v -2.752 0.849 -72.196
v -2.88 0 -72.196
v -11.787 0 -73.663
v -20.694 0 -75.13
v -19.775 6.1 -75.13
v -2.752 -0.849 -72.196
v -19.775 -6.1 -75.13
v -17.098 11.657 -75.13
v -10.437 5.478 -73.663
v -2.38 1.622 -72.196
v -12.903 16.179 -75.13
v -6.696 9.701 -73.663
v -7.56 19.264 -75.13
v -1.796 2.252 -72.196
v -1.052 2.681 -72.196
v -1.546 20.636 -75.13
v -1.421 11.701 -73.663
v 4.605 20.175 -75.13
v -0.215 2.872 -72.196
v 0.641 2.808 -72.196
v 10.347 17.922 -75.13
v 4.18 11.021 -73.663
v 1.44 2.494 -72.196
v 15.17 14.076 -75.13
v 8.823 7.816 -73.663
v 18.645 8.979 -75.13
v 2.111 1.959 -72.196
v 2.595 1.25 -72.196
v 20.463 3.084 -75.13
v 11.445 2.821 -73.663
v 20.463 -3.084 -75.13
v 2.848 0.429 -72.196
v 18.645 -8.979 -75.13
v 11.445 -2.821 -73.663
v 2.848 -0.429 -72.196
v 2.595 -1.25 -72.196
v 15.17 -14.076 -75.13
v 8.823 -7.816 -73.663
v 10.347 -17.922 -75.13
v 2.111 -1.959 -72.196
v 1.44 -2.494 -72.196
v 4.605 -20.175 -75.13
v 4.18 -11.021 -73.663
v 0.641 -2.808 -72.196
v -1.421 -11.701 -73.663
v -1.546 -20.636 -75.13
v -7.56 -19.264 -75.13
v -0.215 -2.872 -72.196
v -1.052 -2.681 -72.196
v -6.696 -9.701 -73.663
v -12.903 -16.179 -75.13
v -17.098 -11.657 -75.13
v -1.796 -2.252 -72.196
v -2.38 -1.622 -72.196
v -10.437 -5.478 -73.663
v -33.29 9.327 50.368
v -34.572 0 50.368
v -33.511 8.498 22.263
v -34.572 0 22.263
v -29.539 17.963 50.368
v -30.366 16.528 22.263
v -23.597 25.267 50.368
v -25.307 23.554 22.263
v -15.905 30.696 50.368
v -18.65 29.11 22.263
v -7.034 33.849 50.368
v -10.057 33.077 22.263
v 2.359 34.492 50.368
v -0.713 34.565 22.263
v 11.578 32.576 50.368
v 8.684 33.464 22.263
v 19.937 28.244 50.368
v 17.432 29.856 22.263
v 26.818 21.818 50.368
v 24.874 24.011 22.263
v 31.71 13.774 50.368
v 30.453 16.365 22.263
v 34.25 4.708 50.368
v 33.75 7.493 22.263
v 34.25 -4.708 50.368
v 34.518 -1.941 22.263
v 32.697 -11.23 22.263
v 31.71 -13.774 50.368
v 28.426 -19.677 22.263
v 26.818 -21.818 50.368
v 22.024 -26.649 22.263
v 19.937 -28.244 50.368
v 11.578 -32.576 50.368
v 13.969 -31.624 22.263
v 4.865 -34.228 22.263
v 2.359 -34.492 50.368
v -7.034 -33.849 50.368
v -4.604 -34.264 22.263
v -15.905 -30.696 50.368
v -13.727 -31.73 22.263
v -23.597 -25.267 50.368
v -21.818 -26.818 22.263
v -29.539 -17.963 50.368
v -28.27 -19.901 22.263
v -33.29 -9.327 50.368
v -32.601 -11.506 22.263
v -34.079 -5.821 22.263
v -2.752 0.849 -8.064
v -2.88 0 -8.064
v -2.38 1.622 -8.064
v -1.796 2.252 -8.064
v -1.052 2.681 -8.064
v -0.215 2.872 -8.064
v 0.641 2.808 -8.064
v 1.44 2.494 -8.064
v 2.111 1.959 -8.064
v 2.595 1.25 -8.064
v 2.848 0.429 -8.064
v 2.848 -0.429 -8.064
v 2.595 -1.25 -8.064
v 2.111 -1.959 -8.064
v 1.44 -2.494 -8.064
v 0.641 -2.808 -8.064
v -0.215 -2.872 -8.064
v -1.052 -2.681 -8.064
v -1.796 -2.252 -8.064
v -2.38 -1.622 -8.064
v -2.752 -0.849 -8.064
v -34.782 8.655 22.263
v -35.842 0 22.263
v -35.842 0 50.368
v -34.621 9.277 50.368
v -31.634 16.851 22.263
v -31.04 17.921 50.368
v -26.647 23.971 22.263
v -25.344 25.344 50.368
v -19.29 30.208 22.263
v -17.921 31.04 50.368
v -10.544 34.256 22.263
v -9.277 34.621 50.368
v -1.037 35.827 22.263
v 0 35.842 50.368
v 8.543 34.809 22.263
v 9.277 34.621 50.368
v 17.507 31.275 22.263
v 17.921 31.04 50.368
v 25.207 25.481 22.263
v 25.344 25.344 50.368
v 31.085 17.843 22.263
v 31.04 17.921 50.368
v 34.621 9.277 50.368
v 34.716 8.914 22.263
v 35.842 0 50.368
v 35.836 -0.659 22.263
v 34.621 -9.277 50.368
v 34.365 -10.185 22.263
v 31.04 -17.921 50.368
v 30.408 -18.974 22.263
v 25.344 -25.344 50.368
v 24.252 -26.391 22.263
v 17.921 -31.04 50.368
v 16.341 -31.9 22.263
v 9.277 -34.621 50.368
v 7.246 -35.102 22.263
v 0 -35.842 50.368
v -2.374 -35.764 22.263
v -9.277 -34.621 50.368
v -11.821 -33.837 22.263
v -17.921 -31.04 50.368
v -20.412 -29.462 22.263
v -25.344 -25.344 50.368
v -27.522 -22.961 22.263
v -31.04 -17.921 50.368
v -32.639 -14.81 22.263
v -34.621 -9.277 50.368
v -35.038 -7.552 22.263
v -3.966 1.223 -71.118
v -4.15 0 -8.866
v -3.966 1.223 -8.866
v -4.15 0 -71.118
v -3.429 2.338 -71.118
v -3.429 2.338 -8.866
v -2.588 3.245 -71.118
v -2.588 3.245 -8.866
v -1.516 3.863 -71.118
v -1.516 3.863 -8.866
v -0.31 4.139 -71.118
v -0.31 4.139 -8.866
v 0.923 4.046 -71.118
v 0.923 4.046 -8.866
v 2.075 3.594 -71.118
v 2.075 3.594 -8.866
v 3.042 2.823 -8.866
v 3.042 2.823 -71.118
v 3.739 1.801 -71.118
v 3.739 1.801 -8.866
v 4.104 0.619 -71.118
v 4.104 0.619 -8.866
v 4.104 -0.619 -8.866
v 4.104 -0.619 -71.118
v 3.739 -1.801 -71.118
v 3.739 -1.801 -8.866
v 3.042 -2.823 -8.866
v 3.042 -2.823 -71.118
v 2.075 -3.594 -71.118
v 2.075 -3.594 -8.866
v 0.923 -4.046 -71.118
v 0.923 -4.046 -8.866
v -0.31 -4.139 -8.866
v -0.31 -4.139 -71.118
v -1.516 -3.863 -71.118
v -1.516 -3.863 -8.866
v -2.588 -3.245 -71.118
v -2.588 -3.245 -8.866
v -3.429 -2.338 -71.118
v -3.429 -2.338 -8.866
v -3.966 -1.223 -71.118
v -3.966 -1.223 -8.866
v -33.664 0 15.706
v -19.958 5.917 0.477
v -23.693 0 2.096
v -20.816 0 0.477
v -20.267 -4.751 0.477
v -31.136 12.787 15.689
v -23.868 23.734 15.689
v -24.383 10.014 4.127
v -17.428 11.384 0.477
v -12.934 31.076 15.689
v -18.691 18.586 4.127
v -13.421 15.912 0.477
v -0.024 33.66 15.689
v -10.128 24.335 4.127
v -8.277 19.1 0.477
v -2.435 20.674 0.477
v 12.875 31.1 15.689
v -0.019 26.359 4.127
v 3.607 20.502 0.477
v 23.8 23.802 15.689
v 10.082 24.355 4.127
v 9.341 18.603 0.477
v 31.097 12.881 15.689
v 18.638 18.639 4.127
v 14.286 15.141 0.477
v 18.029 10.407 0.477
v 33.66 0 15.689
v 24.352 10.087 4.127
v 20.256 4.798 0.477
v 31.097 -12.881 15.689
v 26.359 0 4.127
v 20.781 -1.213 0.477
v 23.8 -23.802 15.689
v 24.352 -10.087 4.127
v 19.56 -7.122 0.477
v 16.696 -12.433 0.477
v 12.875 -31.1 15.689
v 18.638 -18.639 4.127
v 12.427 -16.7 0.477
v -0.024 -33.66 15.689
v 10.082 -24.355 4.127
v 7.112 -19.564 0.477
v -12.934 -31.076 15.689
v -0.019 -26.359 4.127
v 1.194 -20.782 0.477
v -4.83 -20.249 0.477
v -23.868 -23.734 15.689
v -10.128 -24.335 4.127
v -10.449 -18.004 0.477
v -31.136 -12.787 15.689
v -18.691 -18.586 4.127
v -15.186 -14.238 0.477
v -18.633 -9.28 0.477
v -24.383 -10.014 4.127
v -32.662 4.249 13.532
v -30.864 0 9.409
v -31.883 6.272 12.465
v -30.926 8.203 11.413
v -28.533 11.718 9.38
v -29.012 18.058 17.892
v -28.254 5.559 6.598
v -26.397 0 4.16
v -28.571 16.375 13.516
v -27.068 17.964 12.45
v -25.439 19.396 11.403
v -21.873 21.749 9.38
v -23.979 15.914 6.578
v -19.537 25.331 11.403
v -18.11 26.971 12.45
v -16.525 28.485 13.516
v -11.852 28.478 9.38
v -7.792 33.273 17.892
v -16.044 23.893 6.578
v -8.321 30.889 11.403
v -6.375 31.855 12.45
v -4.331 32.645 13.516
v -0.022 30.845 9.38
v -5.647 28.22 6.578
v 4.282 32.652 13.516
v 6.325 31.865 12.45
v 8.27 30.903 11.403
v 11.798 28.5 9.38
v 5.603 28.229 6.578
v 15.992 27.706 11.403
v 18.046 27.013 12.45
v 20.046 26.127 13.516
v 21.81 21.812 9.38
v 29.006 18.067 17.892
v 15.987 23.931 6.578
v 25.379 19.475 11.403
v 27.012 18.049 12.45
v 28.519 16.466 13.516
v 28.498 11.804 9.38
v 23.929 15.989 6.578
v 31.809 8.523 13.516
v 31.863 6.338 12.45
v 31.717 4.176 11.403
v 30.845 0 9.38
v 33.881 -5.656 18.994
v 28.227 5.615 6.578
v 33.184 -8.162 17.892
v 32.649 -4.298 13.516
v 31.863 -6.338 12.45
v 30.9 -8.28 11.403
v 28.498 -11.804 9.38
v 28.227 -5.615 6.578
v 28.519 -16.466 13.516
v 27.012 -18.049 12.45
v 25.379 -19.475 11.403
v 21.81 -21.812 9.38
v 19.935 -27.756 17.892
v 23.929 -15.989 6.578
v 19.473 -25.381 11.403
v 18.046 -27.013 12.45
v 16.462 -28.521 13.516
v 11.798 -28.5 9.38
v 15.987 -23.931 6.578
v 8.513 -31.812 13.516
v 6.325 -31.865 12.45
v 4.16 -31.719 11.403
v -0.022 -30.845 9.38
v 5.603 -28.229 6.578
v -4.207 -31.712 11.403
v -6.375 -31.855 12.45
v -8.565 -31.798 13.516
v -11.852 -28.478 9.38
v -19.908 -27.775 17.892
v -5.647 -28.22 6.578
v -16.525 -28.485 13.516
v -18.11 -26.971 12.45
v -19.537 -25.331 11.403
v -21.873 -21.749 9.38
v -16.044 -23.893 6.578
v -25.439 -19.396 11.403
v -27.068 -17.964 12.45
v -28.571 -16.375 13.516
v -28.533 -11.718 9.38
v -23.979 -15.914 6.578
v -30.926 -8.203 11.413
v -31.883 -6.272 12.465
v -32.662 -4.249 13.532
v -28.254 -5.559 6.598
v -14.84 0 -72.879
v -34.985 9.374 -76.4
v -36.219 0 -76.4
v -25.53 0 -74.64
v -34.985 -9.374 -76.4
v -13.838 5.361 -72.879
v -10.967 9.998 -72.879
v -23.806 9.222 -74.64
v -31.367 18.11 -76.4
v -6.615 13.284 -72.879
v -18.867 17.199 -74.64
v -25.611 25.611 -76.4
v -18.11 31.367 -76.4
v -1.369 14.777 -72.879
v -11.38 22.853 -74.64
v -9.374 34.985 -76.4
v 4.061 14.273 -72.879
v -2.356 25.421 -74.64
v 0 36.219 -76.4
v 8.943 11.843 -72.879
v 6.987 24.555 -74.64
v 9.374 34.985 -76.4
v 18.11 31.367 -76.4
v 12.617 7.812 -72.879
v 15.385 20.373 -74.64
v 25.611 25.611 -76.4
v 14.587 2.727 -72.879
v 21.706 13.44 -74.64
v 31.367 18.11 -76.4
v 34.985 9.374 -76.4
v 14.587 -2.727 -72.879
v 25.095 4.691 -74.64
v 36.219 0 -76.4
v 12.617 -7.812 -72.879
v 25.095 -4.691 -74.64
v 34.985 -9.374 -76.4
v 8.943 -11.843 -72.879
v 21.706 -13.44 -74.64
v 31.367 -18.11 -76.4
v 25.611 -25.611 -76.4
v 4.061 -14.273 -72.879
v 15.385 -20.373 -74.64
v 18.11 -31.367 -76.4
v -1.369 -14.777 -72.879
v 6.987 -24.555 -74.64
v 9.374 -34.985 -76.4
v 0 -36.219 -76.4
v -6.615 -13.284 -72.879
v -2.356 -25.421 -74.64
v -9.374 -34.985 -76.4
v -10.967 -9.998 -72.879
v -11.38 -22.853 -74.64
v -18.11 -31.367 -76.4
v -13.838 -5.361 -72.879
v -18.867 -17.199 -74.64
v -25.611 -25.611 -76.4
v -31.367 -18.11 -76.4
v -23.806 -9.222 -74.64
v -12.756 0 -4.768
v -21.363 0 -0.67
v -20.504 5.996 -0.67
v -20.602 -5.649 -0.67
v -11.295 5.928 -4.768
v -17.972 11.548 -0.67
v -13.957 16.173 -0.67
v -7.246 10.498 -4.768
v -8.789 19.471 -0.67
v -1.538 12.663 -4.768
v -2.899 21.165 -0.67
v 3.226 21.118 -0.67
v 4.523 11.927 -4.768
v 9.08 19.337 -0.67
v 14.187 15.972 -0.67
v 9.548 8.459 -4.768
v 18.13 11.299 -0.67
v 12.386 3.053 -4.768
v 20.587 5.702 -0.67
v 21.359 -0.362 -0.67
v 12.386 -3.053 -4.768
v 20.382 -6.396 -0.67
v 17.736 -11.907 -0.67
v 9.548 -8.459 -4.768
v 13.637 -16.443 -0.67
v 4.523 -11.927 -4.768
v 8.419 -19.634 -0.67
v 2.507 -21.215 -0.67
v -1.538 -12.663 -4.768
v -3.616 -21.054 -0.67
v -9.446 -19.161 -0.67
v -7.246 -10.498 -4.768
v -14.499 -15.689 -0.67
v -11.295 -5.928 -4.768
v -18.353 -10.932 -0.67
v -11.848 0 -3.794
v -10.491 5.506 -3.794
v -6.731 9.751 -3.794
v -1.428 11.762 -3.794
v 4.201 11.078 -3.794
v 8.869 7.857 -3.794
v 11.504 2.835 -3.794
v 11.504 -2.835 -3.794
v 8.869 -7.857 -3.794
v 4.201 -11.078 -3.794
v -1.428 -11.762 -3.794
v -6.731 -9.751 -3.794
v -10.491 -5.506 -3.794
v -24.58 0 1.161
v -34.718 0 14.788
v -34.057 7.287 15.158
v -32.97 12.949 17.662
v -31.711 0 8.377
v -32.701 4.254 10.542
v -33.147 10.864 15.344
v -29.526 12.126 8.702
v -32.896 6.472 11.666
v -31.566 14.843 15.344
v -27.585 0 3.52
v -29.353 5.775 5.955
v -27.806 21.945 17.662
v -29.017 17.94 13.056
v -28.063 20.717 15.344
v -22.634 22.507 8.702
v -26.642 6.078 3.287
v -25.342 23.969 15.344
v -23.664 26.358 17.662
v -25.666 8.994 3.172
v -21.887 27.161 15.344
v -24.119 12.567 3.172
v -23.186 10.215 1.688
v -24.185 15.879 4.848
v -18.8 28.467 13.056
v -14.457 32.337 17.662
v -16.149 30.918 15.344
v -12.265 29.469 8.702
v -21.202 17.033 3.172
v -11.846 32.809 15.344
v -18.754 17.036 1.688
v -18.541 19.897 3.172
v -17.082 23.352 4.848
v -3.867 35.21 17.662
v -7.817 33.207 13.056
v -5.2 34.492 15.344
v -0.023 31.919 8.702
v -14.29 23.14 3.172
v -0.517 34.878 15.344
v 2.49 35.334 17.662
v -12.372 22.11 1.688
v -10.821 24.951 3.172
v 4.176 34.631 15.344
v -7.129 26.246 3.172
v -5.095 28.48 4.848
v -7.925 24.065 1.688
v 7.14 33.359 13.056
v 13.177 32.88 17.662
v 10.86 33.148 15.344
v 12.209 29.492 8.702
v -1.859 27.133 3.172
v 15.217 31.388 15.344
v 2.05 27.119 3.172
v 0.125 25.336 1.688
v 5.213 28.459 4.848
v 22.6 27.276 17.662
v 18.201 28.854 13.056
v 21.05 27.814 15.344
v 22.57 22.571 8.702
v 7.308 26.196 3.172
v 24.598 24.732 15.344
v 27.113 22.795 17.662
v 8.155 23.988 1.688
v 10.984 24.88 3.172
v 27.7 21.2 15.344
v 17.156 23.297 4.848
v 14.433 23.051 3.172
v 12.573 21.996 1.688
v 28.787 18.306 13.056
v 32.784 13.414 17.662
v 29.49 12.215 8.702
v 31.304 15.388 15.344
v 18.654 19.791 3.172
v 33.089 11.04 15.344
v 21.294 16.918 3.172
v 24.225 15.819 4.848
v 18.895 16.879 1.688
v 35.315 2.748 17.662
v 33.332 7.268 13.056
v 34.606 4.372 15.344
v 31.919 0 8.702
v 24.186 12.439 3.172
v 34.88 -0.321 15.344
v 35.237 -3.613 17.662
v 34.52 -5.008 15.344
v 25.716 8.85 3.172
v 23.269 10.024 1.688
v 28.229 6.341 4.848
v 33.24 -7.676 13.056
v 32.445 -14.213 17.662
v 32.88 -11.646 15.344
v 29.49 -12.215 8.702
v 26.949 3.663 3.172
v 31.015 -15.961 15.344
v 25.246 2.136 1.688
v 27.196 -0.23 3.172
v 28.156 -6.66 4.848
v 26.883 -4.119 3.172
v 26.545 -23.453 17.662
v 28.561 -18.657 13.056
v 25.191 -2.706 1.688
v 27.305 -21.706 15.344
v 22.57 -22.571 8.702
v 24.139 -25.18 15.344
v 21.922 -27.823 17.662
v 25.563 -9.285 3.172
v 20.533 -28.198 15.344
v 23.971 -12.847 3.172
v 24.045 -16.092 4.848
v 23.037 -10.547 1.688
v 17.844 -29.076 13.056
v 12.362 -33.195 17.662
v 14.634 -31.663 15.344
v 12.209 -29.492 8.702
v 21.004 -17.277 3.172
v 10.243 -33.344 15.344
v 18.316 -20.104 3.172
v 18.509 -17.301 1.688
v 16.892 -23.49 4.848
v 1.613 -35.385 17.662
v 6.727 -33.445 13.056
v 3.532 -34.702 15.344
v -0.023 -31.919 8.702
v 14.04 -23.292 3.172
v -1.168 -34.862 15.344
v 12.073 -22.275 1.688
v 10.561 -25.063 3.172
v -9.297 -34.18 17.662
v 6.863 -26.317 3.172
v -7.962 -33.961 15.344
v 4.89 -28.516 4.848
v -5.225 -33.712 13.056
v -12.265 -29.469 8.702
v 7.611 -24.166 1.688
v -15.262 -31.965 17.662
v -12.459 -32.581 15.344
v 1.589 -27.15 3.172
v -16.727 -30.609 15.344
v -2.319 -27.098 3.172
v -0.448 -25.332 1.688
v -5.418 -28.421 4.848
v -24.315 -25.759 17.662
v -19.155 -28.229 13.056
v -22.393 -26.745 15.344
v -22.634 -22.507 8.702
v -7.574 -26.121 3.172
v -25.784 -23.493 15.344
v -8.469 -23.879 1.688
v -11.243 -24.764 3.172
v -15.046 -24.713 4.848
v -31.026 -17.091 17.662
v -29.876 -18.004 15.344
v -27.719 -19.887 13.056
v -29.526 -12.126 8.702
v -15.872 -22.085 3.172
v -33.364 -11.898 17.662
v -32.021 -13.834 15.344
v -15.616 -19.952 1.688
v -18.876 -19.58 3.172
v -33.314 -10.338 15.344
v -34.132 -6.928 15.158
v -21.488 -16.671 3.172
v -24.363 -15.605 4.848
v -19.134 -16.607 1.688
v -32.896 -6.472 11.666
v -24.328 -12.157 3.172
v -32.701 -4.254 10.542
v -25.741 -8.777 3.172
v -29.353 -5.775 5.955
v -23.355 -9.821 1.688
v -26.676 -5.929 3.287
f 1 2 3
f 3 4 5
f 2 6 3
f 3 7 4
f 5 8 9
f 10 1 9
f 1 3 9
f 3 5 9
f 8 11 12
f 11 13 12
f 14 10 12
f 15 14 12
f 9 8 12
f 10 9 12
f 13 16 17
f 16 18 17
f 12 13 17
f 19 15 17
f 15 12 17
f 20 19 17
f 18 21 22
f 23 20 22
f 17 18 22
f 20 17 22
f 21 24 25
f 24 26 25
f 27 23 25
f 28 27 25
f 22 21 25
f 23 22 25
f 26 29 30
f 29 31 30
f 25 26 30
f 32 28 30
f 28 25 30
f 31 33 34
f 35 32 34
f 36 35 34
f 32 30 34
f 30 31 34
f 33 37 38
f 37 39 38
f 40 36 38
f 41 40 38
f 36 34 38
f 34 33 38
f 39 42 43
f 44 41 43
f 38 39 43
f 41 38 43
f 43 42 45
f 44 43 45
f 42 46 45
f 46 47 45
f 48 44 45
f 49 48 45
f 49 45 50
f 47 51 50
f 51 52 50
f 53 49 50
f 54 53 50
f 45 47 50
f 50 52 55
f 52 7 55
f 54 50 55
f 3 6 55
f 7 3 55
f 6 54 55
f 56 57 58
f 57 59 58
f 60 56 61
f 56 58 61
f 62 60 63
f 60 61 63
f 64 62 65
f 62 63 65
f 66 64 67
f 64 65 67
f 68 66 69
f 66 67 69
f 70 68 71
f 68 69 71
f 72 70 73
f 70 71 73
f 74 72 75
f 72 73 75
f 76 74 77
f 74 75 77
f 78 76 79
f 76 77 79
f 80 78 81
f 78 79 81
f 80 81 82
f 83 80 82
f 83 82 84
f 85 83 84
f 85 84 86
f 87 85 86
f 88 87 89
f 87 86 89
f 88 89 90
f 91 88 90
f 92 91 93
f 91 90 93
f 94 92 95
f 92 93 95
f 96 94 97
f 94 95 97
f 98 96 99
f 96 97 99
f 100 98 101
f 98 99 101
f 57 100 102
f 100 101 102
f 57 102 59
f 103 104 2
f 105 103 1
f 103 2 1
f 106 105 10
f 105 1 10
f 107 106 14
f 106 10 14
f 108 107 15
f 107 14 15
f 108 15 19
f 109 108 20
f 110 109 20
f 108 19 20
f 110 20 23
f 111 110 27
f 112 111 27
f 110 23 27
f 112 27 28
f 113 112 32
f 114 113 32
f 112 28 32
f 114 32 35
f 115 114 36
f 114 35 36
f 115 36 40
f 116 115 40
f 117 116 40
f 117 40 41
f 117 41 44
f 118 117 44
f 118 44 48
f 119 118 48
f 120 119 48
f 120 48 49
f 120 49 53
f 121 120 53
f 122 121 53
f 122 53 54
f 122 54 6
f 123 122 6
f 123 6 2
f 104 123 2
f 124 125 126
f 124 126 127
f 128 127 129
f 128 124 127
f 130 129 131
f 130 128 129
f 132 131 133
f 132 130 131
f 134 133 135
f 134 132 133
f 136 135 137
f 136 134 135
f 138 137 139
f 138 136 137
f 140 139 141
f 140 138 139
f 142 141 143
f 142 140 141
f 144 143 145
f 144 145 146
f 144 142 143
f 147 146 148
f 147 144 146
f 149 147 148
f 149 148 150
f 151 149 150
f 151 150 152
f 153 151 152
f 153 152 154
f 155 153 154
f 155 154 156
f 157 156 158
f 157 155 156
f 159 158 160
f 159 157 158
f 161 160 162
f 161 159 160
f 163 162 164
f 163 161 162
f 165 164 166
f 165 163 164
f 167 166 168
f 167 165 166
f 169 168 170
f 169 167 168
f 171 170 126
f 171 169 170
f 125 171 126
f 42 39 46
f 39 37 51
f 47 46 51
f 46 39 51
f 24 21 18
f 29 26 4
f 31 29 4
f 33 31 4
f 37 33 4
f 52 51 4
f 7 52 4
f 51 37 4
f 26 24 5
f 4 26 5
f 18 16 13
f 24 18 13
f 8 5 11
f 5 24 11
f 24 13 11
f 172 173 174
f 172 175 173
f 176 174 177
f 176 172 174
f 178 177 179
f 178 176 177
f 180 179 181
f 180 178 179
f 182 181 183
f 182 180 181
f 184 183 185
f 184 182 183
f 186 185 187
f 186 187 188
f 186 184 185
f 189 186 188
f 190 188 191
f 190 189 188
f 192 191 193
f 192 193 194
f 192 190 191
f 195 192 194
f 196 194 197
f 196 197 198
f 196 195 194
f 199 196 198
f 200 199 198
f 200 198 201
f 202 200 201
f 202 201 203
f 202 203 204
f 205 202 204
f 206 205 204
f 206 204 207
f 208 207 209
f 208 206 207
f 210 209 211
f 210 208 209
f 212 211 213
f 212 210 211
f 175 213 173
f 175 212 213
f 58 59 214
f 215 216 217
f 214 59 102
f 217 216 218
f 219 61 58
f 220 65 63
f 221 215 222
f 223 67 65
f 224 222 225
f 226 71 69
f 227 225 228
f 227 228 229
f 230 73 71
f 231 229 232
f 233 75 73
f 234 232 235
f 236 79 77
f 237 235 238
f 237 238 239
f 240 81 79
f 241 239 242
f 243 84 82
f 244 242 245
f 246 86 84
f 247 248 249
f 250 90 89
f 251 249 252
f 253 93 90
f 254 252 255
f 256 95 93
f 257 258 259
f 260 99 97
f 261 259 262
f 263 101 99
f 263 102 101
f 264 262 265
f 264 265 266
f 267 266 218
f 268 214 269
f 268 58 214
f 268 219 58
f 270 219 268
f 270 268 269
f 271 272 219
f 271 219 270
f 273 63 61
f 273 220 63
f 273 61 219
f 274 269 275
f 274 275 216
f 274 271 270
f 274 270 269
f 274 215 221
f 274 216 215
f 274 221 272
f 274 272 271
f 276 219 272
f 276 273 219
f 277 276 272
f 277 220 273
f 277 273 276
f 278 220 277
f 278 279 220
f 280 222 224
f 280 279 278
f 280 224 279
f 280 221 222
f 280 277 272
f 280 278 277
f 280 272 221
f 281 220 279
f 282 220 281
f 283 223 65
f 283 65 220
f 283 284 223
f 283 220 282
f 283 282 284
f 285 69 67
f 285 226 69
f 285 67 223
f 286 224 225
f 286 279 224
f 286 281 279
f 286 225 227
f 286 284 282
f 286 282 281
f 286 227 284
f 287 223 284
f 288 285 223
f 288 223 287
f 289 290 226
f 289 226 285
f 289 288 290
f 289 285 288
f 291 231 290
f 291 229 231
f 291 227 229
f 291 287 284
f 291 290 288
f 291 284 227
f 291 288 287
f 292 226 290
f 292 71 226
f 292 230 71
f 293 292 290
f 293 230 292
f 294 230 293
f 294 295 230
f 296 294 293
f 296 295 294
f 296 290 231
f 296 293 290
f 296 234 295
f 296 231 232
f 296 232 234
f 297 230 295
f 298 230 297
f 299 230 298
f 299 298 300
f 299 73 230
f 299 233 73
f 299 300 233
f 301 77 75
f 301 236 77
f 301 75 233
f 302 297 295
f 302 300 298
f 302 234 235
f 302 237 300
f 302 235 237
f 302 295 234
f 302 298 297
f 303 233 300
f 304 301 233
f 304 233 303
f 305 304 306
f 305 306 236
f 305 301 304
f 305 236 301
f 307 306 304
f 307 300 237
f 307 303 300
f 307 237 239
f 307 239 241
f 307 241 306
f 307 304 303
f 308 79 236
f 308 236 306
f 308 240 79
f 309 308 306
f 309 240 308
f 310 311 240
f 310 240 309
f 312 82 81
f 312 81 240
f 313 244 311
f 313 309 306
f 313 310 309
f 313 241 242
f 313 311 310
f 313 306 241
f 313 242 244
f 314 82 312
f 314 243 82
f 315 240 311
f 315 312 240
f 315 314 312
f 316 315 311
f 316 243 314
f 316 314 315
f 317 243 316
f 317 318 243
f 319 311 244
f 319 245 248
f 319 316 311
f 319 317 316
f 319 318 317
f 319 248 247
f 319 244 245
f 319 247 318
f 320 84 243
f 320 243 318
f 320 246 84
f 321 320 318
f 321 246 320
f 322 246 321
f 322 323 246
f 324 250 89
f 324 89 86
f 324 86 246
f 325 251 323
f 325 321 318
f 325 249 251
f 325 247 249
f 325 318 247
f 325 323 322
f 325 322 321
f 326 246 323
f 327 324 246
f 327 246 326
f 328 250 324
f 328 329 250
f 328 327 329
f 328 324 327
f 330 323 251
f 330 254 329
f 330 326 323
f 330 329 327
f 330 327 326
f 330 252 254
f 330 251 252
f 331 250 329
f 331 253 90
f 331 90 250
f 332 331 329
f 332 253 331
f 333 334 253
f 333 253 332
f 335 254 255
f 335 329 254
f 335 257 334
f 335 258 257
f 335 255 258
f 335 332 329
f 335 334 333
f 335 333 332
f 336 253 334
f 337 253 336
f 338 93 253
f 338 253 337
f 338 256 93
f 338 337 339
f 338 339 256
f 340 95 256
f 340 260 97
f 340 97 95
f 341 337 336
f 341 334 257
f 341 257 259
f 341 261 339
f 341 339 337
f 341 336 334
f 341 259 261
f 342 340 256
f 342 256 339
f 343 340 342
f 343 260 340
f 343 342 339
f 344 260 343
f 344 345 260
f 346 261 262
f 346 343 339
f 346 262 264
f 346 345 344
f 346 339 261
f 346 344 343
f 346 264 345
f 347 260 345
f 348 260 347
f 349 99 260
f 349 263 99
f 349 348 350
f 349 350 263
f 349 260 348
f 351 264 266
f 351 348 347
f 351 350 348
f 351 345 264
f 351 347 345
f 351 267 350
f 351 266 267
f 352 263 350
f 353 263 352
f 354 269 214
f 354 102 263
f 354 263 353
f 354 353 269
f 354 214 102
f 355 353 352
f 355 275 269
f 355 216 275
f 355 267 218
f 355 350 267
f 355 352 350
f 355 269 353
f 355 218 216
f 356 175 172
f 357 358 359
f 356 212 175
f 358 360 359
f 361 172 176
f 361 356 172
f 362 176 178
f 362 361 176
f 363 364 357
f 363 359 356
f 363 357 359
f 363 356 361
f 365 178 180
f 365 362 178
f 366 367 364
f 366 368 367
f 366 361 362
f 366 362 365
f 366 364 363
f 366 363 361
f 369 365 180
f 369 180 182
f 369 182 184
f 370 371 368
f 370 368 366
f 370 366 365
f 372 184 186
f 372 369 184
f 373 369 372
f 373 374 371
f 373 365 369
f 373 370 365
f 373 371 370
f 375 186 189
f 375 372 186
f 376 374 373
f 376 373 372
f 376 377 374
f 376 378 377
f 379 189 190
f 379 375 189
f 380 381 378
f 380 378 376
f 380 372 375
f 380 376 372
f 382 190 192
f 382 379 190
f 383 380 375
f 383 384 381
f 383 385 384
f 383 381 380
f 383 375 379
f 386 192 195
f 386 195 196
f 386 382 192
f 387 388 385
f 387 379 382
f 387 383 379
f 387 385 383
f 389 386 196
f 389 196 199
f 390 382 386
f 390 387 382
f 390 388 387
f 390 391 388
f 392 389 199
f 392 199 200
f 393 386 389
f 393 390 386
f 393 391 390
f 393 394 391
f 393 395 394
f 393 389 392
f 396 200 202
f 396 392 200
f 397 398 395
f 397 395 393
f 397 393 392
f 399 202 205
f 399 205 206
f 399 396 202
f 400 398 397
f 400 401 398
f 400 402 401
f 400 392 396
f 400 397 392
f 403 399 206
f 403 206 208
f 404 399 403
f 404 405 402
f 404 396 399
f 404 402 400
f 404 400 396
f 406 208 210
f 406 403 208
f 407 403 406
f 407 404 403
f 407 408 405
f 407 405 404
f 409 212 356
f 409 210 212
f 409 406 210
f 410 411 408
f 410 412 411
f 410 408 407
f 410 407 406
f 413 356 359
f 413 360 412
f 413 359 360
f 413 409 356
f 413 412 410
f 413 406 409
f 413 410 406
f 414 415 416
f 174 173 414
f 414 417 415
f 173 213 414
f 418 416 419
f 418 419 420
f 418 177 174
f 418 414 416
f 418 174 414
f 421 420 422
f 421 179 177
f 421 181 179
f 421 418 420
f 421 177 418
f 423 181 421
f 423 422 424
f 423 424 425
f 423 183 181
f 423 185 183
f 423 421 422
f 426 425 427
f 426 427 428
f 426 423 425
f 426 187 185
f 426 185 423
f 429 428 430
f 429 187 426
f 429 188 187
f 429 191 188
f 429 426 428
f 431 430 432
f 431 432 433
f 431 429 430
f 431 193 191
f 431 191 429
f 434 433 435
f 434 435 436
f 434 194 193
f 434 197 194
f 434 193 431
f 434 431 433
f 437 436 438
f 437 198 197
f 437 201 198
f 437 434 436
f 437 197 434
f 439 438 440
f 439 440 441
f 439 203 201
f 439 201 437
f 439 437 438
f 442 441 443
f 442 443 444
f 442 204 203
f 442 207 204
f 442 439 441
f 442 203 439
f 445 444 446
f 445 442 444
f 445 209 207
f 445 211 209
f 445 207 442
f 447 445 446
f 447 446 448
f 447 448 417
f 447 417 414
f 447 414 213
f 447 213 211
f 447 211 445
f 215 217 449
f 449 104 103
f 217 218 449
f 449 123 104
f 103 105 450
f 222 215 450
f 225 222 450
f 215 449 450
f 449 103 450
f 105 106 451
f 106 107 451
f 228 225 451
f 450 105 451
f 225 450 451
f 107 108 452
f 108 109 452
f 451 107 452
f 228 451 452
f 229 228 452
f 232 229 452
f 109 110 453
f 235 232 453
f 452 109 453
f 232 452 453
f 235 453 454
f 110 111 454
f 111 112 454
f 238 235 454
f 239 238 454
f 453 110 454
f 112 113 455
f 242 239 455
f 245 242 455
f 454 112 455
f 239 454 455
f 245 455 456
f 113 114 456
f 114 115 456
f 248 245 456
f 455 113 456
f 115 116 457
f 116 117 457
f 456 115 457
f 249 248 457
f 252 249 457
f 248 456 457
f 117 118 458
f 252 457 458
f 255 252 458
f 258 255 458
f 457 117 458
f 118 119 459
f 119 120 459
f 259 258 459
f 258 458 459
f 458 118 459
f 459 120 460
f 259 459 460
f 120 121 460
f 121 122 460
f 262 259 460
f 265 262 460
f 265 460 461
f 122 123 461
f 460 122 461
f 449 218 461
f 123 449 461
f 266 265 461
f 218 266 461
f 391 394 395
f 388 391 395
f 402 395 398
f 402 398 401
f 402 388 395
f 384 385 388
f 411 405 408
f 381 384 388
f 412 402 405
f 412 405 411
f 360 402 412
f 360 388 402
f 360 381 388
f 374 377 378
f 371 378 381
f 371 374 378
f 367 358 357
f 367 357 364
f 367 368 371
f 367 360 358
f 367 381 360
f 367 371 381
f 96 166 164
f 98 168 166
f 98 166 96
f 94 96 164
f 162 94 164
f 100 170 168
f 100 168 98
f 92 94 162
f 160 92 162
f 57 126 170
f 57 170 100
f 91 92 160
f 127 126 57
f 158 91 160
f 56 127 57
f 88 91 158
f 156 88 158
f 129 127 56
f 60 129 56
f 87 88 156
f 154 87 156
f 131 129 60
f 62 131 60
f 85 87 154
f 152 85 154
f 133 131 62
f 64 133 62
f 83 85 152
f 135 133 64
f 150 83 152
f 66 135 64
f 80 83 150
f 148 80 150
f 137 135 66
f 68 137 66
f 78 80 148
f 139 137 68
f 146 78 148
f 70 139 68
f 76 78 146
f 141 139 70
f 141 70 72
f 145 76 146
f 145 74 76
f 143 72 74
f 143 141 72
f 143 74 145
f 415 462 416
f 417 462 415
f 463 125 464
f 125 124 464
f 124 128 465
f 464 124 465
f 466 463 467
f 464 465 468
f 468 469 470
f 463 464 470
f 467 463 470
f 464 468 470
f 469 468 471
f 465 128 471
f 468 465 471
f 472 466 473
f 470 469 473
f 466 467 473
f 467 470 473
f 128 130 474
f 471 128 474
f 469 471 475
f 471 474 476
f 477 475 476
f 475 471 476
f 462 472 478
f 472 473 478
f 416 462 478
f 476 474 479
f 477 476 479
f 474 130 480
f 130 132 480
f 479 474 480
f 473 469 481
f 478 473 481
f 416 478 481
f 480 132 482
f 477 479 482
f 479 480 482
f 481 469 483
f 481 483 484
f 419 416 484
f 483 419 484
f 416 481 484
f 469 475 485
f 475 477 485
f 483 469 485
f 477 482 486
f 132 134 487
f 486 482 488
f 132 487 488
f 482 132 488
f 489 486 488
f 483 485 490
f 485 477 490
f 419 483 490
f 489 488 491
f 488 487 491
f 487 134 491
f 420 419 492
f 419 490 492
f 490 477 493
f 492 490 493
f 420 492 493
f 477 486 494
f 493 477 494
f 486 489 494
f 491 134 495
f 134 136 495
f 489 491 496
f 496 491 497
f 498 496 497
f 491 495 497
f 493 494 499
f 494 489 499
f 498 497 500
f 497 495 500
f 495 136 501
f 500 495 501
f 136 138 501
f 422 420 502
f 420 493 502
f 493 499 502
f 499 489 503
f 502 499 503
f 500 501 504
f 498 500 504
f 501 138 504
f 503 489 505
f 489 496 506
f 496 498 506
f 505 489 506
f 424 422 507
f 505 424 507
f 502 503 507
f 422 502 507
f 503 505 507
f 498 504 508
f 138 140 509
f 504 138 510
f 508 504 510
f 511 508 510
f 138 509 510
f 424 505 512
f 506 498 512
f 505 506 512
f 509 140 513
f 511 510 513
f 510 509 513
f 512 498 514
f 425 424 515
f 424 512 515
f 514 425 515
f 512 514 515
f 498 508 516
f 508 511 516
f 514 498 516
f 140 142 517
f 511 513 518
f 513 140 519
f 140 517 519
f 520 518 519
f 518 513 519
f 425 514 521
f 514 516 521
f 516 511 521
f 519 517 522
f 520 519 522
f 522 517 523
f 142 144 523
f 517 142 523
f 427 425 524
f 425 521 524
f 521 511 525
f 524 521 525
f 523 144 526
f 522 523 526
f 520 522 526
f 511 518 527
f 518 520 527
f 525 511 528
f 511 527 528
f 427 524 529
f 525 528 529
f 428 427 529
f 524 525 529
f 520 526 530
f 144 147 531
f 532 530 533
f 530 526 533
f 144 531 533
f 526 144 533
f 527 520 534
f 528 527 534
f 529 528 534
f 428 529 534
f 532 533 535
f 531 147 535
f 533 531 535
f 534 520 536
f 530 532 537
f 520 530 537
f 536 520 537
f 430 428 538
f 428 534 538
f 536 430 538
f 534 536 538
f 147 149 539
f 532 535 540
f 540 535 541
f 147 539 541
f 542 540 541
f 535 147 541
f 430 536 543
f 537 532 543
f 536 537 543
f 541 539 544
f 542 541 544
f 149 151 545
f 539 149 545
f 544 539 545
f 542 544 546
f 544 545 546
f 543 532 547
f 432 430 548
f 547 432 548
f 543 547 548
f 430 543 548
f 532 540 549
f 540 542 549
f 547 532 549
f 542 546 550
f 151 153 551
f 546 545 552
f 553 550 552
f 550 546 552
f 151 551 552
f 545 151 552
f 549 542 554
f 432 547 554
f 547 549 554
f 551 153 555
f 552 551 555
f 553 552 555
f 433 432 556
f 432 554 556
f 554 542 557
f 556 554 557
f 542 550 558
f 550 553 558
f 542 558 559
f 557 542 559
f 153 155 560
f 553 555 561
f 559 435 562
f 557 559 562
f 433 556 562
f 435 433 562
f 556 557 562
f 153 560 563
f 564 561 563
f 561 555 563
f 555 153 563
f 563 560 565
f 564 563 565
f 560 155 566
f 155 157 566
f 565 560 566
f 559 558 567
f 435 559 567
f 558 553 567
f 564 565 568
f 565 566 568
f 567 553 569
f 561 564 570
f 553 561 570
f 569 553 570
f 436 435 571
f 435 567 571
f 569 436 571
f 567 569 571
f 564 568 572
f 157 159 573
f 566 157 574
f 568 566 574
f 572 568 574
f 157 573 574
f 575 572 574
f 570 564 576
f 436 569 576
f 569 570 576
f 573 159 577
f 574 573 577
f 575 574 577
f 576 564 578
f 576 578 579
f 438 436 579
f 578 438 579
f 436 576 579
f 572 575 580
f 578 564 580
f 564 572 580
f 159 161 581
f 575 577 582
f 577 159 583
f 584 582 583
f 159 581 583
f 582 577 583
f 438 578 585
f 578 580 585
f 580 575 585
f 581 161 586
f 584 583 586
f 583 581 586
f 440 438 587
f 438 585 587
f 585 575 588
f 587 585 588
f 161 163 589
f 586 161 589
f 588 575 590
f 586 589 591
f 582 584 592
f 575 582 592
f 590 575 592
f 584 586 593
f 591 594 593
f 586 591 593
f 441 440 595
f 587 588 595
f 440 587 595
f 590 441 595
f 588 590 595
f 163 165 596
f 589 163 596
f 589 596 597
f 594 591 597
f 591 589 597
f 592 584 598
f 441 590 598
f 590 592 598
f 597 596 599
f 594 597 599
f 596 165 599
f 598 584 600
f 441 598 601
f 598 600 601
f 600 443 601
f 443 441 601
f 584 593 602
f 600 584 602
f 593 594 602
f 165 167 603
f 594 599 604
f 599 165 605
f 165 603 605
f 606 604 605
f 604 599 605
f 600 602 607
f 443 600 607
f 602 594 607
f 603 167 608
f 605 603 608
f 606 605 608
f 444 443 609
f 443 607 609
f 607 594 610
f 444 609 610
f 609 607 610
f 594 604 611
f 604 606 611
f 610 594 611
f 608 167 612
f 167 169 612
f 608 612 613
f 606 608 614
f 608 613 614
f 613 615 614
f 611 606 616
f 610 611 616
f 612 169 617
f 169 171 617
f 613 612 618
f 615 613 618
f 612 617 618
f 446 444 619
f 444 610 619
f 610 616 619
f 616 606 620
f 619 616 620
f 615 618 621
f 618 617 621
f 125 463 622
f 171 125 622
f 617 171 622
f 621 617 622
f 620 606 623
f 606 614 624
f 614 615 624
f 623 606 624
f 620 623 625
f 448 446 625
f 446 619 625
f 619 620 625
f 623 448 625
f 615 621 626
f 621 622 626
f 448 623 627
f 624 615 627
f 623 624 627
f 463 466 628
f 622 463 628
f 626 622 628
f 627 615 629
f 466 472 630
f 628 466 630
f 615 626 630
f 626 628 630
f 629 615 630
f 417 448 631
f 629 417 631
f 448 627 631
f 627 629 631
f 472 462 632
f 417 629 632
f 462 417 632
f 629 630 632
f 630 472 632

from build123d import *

# Parameters (mm, degrees)
F2_R = 25.4
F3_T = -1.27


with BuildPart() as f1:
    # F0 (on Front) → F1 (revolve)
    with BuildSketch(Plane.XZ):
        Polygon((-36.2194851041, -76.4004662633), (0, -76.4004662633), (0, 50.3677166998), (-35.8421988785, 50.3677166998), (-35.8421988785, 6.2252227217), (-4.1501536034, -8.8662281632), (-4.1501536034, -71.1184665561), align=None)
    revolve(axis=Axis((0, 0, -13.0163747817), (0, 0, -1)))

    # F2
    f2_edges = [f1.edges().sort_by_distance(p)[0] for p in [
        (35.842199, 0, 6.225223),
    ]]
    fillet(f2_edges, radius=F2_R)

    # F3
    f3_openings = [f1.faces().sort_by_distance(p)[0] for p in [
        (0, 0, 50.367717),
    ]]
    offset(amount=F3_T, openings=f3_openings, kind=Kind.INTERSECTION)


solid = f1.part
